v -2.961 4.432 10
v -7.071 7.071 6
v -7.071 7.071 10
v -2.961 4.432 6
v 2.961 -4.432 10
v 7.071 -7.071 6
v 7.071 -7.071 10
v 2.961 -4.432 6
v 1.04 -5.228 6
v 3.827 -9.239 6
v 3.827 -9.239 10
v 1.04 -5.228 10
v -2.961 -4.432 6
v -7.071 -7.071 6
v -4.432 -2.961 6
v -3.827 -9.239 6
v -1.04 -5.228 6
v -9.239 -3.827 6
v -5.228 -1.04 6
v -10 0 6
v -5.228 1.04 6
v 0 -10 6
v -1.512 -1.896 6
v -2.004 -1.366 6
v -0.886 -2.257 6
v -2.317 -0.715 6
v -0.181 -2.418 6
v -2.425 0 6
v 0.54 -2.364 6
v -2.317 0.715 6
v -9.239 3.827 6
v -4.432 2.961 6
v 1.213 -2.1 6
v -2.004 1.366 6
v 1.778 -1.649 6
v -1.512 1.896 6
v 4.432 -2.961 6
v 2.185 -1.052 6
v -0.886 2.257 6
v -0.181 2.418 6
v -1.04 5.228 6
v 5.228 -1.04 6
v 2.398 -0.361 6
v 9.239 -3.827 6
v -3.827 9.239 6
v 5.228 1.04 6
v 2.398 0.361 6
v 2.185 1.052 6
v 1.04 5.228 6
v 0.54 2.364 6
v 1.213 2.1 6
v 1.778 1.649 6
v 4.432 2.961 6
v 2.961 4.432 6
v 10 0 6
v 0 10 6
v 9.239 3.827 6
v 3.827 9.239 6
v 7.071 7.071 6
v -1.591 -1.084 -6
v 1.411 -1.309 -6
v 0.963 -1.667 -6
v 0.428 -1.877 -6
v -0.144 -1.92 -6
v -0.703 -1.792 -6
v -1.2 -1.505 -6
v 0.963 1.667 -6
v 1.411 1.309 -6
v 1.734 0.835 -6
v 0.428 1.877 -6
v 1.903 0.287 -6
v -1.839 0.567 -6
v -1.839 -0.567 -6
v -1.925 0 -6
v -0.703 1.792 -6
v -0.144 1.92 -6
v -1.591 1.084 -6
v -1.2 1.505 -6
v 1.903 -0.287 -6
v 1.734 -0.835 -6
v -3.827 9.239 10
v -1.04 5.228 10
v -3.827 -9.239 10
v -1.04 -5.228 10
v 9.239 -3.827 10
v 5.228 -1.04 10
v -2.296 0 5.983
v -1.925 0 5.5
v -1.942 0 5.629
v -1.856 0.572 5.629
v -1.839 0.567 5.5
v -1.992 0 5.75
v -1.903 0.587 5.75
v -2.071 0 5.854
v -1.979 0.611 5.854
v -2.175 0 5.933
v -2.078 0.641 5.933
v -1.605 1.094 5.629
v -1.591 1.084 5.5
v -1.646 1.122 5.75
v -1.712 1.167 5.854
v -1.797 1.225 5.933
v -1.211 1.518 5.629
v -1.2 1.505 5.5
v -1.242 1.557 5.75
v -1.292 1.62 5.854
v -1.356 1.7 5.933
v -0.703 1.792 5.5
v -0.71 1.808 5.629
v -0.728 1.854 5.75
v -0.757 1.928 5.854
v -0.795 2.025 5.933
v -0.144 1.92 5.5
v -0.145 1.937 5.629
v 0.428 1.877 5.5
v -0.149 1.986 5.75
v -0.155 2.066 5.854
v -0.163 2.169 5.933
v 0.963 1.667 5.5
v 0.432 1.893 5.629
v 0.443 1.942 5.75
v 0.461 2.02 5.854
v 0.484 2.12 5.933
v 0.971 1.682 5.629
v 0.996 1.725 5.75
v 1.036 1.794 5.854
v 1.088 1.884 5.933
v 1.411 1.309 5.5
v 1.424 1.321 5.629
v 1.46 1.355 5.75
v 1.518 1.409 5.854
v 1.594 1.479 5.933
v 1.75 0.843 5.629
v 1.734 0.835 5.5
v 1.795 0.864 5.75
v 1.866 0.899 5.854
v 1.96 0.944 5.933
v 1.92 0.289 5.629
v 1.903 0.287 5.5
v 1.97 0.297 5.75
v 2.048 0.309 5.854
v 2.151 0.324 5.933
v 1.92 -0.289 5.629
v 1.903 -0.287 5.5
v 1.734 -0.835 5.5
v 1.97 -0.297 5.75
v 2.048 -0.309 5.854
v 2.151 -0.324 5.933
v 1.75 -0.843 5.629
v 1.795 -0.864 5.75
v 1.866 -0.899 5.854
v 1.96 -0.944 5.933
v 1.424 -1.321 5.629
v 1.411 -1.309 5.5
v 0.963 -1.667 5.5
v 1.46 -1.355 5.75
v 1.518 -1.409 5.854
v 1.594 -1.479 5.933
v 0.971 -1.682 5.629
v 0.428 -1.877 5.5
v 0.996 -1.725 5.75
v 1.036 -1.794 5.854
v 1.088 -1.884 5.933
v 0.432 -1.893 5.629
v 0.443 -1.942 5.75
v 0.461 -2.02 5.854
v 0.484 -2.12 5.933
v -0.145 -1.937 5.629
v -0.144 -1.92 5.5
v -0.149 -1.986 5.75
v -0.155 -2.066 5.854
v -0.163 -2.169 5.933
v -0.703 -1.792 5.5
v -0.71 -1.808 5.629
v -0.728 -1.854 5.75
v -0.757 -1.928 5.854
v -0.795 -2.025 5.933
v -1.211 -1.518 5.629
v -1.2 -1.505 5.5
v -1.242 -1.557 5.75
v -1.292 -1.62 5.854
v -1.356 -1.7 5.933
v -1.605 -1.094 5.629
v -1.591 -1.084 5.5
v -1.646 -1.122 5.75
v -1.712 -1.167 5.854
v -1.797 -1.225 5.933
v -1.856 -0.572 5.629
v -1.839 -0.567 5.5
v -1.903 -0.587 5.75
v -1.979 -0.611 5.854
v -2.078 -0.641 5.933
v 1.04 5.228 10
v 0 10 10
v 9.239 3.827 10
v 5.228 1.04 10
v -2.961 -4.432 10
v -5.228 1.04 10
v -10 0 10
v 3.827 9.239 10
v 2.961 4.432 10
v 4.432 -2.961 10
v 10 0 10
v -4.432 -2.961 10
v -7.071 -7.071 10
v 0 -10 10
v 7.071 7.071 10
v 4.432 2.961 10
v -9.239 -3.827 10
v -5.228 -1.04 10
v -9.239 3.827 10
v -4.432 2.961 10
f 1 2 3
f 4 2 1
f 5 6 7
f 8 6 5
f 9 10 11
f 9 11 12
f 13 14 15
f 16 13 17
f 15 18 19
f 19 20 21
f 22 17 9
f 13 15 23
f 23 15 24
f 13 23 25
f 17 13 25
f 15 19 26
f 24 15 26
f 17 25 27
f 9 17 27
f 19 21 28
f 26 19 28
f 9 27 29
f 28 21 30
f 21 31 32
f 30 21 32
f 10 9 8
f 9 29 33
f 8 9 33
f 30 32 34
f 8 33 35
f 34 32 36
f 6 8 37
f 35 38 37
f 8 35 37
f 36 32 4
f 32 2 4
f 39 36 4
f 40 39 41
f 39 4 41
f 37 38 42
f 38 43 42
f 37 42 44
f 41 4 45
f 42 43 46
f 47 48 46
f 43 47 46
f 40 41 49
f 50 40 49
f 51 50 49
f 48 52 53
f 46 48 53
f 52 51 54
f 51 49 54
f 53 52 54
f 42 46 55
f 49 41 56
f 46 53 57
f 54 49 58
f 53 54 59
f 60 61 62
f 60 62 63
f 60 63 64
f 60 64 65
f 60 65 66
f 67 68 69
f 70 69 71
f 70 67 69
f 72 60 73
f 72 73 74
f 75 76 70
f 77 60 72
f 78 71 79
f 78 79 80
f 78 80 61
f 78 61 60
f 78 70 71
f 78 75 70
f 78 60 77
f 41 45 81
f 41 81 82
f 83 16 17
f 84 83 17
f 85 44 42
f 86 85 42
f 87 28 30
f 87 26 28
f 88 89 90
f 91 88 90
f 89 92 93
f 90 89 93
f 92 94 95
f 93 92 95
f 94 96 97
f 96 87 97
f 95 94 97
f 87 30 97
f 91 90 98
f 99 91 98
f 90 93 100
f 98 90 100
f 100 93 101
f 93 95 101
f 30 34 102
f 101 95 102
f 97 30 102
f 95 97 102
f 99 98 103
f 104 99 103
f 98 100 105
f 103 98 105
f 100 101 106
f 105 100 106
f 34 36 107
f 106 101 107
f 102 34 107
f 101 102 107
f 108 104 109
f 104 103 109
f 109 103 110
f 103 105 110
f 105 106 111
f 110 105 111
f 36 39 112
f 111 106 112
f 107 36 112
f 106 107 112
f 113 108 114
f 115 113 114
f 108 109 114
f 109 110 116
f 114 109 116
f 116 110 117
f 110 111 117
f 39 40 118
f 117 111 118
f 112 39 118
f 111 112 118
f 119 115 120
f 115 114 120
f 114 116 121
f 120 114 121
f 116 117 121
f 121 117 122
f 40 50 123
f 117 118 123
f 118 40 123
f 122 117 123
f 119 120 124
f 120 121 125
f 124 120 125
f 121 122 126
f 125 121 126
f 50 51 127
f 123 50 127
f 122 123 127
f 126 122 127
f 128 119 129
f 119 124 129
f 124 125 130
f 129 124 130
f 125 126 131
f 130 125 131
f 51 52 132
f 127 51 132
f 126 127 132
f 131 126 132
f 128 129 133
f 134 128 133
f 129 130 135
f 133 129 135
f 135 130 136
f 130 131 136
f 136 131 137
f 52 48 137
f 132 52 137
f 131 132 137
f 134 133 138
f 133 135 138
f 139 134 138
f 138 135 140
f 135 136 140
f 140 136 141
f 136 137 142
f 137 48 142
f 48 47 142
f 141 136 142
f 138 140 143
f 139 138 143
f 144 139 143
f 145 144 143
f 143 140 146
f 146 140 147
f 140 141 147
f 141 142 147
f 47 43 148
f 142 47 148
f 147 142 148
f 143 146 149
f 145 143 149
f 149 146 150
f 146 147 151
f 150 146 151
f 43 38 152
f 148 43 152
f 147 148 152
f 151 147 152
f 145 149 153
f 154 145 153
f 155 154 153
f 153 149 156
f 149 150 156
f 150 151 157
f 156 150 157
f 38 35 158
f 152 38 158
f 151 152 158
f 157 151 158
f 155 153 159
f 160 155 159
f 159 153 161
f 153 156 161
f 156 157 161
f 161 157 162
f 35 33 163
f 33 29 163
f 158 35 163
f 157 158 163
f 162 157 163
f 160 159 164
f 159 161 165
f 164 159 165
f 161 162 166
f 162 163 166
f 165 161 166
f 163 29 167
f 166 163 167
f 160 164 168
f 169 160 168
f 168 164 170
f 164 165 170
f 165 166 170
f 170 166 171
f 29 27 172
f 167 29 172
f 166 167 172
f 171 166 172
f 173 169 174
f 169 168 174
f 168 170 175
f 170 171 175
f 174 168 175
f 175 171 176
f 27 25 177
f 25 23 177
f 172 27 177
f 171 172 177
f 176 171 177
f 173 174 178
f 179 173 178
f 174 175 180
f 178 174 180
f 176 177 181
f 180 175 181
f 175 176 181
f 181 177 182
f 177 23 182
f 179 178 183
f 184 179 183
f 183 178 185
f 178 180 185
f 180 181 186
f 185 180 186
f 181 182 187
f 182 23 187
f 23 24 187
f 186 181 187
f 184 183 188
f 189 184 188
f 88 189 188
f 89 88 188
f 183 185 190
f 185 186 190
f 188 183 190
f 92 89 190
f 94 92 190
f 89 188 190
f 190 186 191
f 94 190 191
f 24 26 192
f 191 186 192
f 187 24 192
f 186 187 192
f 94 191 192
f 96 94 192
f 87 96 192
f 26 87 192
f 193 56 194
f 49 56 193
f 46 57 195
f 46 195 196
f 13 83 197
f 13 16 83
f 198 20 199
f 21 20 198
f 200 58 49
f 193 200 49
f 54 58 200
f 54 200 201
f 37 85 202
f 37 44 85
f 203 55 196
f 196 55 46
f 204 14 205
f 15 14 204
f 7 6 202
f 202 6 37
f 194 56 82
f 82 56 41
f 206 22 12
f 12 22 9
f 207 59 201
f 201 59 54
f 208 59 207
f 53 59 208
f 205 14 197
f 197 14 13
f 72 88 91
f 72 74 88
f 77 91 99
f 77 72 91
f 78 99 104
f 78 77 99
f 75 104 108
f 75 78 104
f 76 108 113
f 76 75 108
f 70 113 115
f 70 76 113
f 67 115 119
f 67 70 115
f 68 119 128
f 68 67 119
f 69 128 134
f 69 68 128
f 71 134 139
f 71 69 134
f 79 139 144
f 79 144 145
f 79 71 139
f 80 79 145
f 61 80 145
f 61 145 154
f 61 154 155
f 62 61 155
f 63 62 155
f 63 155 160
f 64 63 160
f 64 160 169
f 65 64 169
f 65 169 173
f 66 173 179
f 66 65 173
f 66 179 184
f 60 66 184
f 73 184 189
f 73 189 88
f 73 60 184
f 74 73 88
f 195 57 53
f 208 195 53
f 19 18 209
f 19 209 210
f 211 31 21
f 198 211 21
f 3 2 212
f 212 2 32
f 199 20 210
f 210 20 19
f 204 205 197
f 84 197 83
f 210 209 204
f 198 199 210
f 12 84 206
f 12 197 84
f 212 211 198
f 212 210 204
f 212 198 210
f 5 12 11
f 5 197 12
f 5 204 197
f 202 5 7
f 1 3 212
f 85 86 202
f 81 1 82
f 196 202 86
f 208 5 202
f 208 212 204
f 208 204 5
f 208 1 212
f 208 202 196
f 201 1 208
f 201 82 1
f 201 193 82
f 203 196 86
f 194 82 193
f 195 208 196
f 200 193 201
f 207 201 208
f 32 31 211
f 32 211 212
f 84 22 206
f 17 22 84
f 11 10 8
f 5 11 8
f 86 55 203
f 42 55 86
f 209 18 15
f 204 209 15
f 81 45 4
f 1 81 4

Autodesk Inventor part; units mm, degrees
ref_plane "YZ Plane" through (0, 0, 0) normal (1, 0, 0) x (0, 1, 0)
ref_plane "XZ Plane" through (0, 0, 0) normal (0, 1, 0) x (-1, 0, 0)
ref_plane "XY Plane" through (0, 0, 0) normal (0, 0, 1) x (1, 0, 0)
sketch "Szkic1" plane through (0, 0, 0) normal (0, 0, 1) x (1, 0, 0)
  circle A0 centre (0, 0) radius 3.25
  dimension "d0" = 6.5
extrude "Wyciągnięcie proste1" add sketch "Szkic1" along normal blind 6
sketch "Szkic3" plane through (0, 0, 0) normal (0, 0, -1) x (-1, 0, 0)
  circle A0 centre (0, 0) radius 3.65
  dimension "d11" = 7.3
extrude "Wyciągnięcie proste3" add sketch "Szkic3" against normal blind 6
sketch "Szkic4" plane through (0, 0, 6) normal (0, 0, 1) x (1, 0, 0)
  circle A0 centre (0, 0) radius 3.65 projected
  circle A1 centre (0, 0) radius 3.65
  line L0 (0, 0) -> (0, 9)
  line L1 (0, 9) -> (0, 9.5)
  line L2 (0, 9.5) -> (6.3185, 9.5) construction
  line L3 (0, 9.5) -> (0, 10)
  line L4 (0, 10) -> (1.4493, 3.3499)
  line L5 (0, 10) -> (-1.4493, 3.3499)
  line L6 (-3.8268, 9.2388) -> (0.057, 3.6496)
  line L7 (-3.8268, 9.2388) -> (-2.6209, 2.5403)
  line L8 (-7.0711, 7.0711) -> (-1.344, 3.3936)
  line L9 (-7.0711, 7.0711) -> (-3.3936, 1.344)
  line L10 (-9.2388, 3.8268) -> (-2.5403, 2.6209)
  line L11 (-9.2388, 3.8268) -> (-3.6496, -0.057)
  line L12 (-10, 0) -> (-3.3499, 1.4493)
  line L13 (-10, 0) -> (-3.3499, -1.4493)
  line L14 (-9.2388, -3.8268) -> (-3.6496, 0.057)
  line L15 (-9.2388, -3.8268) -> (-2.5403, -2.6209)
  line L16 (-7.0711, -7.0711) -> (-3.3936, -1.344)
  line L17 (-7.0711, -7.0711) -> (-1.344, -3.3936)
  line L18 (-3.8268, -9.2388) -> (-2.6209, -2.5403)
  line L19 (-3.8268, -9.2388) -> (0.057, -3.6496)
  line L20 (0, -10) -> (-1.4493, -3.3499)
  line L21 (0, -10) -> (1.4493, -3.3499)
  line L22 (3.8268, -9.2388) -> (-0.057, -3.6496)
  line L23 (3.8268, -9.2388) -> (2.6209, -2.5403)
  line L24 (7.0711, -7.0711) -> (1.344, -3.3936)
  line L25 (7.0711, -7.0711) -> (3.3936, -1.344)
  line L26 (9.2388, -3.8268) -> (2.5403, -2.6209)
  line L27 (9.2388, -3.8268) -> (3.6496, 0.057)
  line L28 (10, 0) -> (3.3499, -1.4493)
  line L29 (10, 0) -> (3.3499, 1.4493)
  line L30 (9.2388, 3.8268) -> (3.6496, -0.057)
  line L31 (9.2388, 3.8268) -> (2.5403, 2.6209)
  line L32 (7.0711, 7.0711) -> (3.3936, 1.344)
  line L33 (7.0711, 7.0711) -> (1.344, 3.3936)
  line L34 (3.8268, 9.2388) -> (2.6209, 2.5403)
  line L35 (3.8268, 9.2388) -> (-0.057, 3.6496)
  point P0 (-2.9615, 4.4322)
  point P1 (-4.4322, 2.9615)
  point P2 (-5.2282, 1.0399)
  point P3 (-5.2282, -1.0399)
  point P4 (-4.4322, -2.9615)
  point P5 (-2.9615, -4.4322)
  point P6 (-1.0399, -5.2282)
  point P7 (1.0399, -5.2282)
  point P8 (2.9615, -4.4322)
  point P9 (4.4322, -2.9615)
  point P10 (5.2282, -1.0399)
  point P11 (5.2282, 1.0399)
  point P12 (4.4322, 2.9615)
  point P13 (2.9615, 4.4322)
  point P14 (1.0399, 5.2282)
  point P15 (-1.0399, 5.2282)
  dimension "d34" = 9
  dimension "d39" = 0.5
  dimension "d49" = 0.5
  dimension "d52" = 360
extrude "Wyciągnięcie proste4" add sketch "Szkic4" along normal blind 4
sketch "Szkic5" plane through (0, 0, 0) normal (0, 0, -1) x (-1, 0, 0)
  circle A0 centre (0, 0) radius 3.65
extrude "Wyciągnięcie proste5" add sketch "Szkic5" along normal blind 6
sketch "Szkic6" plane through (0, 0, -6) normal (0, 0, -1) x (-1, 0, 0)
  circle A0 centre (0, 0) radius 1.425
  circle A1 centre (0, 0) radius 3.65
  dimension "d30" = 2.85
extrude "Wyciągnięcie proste6" cut sketch "Szkic6" against normal blind 12
fillet "Zaokrąglenie1" radius 0.5 1 edges at (1.425, 0, 6)
sketch "Szkic7" plane through (0, 0, -6) normal (0, 0, -1) x (-1, 0, 0)
  circle A0 centre (0, 0) radius 1.925
  dimension "d45" = 3.85
extrude "Wyciągnięcie proste7" add sketch "Szkic7" against normal blind 12.75
fillet "Zaokrąglenie2" radius 0.5 1 edges at (1.925, 0, 6)
properties part number "GEAR"
